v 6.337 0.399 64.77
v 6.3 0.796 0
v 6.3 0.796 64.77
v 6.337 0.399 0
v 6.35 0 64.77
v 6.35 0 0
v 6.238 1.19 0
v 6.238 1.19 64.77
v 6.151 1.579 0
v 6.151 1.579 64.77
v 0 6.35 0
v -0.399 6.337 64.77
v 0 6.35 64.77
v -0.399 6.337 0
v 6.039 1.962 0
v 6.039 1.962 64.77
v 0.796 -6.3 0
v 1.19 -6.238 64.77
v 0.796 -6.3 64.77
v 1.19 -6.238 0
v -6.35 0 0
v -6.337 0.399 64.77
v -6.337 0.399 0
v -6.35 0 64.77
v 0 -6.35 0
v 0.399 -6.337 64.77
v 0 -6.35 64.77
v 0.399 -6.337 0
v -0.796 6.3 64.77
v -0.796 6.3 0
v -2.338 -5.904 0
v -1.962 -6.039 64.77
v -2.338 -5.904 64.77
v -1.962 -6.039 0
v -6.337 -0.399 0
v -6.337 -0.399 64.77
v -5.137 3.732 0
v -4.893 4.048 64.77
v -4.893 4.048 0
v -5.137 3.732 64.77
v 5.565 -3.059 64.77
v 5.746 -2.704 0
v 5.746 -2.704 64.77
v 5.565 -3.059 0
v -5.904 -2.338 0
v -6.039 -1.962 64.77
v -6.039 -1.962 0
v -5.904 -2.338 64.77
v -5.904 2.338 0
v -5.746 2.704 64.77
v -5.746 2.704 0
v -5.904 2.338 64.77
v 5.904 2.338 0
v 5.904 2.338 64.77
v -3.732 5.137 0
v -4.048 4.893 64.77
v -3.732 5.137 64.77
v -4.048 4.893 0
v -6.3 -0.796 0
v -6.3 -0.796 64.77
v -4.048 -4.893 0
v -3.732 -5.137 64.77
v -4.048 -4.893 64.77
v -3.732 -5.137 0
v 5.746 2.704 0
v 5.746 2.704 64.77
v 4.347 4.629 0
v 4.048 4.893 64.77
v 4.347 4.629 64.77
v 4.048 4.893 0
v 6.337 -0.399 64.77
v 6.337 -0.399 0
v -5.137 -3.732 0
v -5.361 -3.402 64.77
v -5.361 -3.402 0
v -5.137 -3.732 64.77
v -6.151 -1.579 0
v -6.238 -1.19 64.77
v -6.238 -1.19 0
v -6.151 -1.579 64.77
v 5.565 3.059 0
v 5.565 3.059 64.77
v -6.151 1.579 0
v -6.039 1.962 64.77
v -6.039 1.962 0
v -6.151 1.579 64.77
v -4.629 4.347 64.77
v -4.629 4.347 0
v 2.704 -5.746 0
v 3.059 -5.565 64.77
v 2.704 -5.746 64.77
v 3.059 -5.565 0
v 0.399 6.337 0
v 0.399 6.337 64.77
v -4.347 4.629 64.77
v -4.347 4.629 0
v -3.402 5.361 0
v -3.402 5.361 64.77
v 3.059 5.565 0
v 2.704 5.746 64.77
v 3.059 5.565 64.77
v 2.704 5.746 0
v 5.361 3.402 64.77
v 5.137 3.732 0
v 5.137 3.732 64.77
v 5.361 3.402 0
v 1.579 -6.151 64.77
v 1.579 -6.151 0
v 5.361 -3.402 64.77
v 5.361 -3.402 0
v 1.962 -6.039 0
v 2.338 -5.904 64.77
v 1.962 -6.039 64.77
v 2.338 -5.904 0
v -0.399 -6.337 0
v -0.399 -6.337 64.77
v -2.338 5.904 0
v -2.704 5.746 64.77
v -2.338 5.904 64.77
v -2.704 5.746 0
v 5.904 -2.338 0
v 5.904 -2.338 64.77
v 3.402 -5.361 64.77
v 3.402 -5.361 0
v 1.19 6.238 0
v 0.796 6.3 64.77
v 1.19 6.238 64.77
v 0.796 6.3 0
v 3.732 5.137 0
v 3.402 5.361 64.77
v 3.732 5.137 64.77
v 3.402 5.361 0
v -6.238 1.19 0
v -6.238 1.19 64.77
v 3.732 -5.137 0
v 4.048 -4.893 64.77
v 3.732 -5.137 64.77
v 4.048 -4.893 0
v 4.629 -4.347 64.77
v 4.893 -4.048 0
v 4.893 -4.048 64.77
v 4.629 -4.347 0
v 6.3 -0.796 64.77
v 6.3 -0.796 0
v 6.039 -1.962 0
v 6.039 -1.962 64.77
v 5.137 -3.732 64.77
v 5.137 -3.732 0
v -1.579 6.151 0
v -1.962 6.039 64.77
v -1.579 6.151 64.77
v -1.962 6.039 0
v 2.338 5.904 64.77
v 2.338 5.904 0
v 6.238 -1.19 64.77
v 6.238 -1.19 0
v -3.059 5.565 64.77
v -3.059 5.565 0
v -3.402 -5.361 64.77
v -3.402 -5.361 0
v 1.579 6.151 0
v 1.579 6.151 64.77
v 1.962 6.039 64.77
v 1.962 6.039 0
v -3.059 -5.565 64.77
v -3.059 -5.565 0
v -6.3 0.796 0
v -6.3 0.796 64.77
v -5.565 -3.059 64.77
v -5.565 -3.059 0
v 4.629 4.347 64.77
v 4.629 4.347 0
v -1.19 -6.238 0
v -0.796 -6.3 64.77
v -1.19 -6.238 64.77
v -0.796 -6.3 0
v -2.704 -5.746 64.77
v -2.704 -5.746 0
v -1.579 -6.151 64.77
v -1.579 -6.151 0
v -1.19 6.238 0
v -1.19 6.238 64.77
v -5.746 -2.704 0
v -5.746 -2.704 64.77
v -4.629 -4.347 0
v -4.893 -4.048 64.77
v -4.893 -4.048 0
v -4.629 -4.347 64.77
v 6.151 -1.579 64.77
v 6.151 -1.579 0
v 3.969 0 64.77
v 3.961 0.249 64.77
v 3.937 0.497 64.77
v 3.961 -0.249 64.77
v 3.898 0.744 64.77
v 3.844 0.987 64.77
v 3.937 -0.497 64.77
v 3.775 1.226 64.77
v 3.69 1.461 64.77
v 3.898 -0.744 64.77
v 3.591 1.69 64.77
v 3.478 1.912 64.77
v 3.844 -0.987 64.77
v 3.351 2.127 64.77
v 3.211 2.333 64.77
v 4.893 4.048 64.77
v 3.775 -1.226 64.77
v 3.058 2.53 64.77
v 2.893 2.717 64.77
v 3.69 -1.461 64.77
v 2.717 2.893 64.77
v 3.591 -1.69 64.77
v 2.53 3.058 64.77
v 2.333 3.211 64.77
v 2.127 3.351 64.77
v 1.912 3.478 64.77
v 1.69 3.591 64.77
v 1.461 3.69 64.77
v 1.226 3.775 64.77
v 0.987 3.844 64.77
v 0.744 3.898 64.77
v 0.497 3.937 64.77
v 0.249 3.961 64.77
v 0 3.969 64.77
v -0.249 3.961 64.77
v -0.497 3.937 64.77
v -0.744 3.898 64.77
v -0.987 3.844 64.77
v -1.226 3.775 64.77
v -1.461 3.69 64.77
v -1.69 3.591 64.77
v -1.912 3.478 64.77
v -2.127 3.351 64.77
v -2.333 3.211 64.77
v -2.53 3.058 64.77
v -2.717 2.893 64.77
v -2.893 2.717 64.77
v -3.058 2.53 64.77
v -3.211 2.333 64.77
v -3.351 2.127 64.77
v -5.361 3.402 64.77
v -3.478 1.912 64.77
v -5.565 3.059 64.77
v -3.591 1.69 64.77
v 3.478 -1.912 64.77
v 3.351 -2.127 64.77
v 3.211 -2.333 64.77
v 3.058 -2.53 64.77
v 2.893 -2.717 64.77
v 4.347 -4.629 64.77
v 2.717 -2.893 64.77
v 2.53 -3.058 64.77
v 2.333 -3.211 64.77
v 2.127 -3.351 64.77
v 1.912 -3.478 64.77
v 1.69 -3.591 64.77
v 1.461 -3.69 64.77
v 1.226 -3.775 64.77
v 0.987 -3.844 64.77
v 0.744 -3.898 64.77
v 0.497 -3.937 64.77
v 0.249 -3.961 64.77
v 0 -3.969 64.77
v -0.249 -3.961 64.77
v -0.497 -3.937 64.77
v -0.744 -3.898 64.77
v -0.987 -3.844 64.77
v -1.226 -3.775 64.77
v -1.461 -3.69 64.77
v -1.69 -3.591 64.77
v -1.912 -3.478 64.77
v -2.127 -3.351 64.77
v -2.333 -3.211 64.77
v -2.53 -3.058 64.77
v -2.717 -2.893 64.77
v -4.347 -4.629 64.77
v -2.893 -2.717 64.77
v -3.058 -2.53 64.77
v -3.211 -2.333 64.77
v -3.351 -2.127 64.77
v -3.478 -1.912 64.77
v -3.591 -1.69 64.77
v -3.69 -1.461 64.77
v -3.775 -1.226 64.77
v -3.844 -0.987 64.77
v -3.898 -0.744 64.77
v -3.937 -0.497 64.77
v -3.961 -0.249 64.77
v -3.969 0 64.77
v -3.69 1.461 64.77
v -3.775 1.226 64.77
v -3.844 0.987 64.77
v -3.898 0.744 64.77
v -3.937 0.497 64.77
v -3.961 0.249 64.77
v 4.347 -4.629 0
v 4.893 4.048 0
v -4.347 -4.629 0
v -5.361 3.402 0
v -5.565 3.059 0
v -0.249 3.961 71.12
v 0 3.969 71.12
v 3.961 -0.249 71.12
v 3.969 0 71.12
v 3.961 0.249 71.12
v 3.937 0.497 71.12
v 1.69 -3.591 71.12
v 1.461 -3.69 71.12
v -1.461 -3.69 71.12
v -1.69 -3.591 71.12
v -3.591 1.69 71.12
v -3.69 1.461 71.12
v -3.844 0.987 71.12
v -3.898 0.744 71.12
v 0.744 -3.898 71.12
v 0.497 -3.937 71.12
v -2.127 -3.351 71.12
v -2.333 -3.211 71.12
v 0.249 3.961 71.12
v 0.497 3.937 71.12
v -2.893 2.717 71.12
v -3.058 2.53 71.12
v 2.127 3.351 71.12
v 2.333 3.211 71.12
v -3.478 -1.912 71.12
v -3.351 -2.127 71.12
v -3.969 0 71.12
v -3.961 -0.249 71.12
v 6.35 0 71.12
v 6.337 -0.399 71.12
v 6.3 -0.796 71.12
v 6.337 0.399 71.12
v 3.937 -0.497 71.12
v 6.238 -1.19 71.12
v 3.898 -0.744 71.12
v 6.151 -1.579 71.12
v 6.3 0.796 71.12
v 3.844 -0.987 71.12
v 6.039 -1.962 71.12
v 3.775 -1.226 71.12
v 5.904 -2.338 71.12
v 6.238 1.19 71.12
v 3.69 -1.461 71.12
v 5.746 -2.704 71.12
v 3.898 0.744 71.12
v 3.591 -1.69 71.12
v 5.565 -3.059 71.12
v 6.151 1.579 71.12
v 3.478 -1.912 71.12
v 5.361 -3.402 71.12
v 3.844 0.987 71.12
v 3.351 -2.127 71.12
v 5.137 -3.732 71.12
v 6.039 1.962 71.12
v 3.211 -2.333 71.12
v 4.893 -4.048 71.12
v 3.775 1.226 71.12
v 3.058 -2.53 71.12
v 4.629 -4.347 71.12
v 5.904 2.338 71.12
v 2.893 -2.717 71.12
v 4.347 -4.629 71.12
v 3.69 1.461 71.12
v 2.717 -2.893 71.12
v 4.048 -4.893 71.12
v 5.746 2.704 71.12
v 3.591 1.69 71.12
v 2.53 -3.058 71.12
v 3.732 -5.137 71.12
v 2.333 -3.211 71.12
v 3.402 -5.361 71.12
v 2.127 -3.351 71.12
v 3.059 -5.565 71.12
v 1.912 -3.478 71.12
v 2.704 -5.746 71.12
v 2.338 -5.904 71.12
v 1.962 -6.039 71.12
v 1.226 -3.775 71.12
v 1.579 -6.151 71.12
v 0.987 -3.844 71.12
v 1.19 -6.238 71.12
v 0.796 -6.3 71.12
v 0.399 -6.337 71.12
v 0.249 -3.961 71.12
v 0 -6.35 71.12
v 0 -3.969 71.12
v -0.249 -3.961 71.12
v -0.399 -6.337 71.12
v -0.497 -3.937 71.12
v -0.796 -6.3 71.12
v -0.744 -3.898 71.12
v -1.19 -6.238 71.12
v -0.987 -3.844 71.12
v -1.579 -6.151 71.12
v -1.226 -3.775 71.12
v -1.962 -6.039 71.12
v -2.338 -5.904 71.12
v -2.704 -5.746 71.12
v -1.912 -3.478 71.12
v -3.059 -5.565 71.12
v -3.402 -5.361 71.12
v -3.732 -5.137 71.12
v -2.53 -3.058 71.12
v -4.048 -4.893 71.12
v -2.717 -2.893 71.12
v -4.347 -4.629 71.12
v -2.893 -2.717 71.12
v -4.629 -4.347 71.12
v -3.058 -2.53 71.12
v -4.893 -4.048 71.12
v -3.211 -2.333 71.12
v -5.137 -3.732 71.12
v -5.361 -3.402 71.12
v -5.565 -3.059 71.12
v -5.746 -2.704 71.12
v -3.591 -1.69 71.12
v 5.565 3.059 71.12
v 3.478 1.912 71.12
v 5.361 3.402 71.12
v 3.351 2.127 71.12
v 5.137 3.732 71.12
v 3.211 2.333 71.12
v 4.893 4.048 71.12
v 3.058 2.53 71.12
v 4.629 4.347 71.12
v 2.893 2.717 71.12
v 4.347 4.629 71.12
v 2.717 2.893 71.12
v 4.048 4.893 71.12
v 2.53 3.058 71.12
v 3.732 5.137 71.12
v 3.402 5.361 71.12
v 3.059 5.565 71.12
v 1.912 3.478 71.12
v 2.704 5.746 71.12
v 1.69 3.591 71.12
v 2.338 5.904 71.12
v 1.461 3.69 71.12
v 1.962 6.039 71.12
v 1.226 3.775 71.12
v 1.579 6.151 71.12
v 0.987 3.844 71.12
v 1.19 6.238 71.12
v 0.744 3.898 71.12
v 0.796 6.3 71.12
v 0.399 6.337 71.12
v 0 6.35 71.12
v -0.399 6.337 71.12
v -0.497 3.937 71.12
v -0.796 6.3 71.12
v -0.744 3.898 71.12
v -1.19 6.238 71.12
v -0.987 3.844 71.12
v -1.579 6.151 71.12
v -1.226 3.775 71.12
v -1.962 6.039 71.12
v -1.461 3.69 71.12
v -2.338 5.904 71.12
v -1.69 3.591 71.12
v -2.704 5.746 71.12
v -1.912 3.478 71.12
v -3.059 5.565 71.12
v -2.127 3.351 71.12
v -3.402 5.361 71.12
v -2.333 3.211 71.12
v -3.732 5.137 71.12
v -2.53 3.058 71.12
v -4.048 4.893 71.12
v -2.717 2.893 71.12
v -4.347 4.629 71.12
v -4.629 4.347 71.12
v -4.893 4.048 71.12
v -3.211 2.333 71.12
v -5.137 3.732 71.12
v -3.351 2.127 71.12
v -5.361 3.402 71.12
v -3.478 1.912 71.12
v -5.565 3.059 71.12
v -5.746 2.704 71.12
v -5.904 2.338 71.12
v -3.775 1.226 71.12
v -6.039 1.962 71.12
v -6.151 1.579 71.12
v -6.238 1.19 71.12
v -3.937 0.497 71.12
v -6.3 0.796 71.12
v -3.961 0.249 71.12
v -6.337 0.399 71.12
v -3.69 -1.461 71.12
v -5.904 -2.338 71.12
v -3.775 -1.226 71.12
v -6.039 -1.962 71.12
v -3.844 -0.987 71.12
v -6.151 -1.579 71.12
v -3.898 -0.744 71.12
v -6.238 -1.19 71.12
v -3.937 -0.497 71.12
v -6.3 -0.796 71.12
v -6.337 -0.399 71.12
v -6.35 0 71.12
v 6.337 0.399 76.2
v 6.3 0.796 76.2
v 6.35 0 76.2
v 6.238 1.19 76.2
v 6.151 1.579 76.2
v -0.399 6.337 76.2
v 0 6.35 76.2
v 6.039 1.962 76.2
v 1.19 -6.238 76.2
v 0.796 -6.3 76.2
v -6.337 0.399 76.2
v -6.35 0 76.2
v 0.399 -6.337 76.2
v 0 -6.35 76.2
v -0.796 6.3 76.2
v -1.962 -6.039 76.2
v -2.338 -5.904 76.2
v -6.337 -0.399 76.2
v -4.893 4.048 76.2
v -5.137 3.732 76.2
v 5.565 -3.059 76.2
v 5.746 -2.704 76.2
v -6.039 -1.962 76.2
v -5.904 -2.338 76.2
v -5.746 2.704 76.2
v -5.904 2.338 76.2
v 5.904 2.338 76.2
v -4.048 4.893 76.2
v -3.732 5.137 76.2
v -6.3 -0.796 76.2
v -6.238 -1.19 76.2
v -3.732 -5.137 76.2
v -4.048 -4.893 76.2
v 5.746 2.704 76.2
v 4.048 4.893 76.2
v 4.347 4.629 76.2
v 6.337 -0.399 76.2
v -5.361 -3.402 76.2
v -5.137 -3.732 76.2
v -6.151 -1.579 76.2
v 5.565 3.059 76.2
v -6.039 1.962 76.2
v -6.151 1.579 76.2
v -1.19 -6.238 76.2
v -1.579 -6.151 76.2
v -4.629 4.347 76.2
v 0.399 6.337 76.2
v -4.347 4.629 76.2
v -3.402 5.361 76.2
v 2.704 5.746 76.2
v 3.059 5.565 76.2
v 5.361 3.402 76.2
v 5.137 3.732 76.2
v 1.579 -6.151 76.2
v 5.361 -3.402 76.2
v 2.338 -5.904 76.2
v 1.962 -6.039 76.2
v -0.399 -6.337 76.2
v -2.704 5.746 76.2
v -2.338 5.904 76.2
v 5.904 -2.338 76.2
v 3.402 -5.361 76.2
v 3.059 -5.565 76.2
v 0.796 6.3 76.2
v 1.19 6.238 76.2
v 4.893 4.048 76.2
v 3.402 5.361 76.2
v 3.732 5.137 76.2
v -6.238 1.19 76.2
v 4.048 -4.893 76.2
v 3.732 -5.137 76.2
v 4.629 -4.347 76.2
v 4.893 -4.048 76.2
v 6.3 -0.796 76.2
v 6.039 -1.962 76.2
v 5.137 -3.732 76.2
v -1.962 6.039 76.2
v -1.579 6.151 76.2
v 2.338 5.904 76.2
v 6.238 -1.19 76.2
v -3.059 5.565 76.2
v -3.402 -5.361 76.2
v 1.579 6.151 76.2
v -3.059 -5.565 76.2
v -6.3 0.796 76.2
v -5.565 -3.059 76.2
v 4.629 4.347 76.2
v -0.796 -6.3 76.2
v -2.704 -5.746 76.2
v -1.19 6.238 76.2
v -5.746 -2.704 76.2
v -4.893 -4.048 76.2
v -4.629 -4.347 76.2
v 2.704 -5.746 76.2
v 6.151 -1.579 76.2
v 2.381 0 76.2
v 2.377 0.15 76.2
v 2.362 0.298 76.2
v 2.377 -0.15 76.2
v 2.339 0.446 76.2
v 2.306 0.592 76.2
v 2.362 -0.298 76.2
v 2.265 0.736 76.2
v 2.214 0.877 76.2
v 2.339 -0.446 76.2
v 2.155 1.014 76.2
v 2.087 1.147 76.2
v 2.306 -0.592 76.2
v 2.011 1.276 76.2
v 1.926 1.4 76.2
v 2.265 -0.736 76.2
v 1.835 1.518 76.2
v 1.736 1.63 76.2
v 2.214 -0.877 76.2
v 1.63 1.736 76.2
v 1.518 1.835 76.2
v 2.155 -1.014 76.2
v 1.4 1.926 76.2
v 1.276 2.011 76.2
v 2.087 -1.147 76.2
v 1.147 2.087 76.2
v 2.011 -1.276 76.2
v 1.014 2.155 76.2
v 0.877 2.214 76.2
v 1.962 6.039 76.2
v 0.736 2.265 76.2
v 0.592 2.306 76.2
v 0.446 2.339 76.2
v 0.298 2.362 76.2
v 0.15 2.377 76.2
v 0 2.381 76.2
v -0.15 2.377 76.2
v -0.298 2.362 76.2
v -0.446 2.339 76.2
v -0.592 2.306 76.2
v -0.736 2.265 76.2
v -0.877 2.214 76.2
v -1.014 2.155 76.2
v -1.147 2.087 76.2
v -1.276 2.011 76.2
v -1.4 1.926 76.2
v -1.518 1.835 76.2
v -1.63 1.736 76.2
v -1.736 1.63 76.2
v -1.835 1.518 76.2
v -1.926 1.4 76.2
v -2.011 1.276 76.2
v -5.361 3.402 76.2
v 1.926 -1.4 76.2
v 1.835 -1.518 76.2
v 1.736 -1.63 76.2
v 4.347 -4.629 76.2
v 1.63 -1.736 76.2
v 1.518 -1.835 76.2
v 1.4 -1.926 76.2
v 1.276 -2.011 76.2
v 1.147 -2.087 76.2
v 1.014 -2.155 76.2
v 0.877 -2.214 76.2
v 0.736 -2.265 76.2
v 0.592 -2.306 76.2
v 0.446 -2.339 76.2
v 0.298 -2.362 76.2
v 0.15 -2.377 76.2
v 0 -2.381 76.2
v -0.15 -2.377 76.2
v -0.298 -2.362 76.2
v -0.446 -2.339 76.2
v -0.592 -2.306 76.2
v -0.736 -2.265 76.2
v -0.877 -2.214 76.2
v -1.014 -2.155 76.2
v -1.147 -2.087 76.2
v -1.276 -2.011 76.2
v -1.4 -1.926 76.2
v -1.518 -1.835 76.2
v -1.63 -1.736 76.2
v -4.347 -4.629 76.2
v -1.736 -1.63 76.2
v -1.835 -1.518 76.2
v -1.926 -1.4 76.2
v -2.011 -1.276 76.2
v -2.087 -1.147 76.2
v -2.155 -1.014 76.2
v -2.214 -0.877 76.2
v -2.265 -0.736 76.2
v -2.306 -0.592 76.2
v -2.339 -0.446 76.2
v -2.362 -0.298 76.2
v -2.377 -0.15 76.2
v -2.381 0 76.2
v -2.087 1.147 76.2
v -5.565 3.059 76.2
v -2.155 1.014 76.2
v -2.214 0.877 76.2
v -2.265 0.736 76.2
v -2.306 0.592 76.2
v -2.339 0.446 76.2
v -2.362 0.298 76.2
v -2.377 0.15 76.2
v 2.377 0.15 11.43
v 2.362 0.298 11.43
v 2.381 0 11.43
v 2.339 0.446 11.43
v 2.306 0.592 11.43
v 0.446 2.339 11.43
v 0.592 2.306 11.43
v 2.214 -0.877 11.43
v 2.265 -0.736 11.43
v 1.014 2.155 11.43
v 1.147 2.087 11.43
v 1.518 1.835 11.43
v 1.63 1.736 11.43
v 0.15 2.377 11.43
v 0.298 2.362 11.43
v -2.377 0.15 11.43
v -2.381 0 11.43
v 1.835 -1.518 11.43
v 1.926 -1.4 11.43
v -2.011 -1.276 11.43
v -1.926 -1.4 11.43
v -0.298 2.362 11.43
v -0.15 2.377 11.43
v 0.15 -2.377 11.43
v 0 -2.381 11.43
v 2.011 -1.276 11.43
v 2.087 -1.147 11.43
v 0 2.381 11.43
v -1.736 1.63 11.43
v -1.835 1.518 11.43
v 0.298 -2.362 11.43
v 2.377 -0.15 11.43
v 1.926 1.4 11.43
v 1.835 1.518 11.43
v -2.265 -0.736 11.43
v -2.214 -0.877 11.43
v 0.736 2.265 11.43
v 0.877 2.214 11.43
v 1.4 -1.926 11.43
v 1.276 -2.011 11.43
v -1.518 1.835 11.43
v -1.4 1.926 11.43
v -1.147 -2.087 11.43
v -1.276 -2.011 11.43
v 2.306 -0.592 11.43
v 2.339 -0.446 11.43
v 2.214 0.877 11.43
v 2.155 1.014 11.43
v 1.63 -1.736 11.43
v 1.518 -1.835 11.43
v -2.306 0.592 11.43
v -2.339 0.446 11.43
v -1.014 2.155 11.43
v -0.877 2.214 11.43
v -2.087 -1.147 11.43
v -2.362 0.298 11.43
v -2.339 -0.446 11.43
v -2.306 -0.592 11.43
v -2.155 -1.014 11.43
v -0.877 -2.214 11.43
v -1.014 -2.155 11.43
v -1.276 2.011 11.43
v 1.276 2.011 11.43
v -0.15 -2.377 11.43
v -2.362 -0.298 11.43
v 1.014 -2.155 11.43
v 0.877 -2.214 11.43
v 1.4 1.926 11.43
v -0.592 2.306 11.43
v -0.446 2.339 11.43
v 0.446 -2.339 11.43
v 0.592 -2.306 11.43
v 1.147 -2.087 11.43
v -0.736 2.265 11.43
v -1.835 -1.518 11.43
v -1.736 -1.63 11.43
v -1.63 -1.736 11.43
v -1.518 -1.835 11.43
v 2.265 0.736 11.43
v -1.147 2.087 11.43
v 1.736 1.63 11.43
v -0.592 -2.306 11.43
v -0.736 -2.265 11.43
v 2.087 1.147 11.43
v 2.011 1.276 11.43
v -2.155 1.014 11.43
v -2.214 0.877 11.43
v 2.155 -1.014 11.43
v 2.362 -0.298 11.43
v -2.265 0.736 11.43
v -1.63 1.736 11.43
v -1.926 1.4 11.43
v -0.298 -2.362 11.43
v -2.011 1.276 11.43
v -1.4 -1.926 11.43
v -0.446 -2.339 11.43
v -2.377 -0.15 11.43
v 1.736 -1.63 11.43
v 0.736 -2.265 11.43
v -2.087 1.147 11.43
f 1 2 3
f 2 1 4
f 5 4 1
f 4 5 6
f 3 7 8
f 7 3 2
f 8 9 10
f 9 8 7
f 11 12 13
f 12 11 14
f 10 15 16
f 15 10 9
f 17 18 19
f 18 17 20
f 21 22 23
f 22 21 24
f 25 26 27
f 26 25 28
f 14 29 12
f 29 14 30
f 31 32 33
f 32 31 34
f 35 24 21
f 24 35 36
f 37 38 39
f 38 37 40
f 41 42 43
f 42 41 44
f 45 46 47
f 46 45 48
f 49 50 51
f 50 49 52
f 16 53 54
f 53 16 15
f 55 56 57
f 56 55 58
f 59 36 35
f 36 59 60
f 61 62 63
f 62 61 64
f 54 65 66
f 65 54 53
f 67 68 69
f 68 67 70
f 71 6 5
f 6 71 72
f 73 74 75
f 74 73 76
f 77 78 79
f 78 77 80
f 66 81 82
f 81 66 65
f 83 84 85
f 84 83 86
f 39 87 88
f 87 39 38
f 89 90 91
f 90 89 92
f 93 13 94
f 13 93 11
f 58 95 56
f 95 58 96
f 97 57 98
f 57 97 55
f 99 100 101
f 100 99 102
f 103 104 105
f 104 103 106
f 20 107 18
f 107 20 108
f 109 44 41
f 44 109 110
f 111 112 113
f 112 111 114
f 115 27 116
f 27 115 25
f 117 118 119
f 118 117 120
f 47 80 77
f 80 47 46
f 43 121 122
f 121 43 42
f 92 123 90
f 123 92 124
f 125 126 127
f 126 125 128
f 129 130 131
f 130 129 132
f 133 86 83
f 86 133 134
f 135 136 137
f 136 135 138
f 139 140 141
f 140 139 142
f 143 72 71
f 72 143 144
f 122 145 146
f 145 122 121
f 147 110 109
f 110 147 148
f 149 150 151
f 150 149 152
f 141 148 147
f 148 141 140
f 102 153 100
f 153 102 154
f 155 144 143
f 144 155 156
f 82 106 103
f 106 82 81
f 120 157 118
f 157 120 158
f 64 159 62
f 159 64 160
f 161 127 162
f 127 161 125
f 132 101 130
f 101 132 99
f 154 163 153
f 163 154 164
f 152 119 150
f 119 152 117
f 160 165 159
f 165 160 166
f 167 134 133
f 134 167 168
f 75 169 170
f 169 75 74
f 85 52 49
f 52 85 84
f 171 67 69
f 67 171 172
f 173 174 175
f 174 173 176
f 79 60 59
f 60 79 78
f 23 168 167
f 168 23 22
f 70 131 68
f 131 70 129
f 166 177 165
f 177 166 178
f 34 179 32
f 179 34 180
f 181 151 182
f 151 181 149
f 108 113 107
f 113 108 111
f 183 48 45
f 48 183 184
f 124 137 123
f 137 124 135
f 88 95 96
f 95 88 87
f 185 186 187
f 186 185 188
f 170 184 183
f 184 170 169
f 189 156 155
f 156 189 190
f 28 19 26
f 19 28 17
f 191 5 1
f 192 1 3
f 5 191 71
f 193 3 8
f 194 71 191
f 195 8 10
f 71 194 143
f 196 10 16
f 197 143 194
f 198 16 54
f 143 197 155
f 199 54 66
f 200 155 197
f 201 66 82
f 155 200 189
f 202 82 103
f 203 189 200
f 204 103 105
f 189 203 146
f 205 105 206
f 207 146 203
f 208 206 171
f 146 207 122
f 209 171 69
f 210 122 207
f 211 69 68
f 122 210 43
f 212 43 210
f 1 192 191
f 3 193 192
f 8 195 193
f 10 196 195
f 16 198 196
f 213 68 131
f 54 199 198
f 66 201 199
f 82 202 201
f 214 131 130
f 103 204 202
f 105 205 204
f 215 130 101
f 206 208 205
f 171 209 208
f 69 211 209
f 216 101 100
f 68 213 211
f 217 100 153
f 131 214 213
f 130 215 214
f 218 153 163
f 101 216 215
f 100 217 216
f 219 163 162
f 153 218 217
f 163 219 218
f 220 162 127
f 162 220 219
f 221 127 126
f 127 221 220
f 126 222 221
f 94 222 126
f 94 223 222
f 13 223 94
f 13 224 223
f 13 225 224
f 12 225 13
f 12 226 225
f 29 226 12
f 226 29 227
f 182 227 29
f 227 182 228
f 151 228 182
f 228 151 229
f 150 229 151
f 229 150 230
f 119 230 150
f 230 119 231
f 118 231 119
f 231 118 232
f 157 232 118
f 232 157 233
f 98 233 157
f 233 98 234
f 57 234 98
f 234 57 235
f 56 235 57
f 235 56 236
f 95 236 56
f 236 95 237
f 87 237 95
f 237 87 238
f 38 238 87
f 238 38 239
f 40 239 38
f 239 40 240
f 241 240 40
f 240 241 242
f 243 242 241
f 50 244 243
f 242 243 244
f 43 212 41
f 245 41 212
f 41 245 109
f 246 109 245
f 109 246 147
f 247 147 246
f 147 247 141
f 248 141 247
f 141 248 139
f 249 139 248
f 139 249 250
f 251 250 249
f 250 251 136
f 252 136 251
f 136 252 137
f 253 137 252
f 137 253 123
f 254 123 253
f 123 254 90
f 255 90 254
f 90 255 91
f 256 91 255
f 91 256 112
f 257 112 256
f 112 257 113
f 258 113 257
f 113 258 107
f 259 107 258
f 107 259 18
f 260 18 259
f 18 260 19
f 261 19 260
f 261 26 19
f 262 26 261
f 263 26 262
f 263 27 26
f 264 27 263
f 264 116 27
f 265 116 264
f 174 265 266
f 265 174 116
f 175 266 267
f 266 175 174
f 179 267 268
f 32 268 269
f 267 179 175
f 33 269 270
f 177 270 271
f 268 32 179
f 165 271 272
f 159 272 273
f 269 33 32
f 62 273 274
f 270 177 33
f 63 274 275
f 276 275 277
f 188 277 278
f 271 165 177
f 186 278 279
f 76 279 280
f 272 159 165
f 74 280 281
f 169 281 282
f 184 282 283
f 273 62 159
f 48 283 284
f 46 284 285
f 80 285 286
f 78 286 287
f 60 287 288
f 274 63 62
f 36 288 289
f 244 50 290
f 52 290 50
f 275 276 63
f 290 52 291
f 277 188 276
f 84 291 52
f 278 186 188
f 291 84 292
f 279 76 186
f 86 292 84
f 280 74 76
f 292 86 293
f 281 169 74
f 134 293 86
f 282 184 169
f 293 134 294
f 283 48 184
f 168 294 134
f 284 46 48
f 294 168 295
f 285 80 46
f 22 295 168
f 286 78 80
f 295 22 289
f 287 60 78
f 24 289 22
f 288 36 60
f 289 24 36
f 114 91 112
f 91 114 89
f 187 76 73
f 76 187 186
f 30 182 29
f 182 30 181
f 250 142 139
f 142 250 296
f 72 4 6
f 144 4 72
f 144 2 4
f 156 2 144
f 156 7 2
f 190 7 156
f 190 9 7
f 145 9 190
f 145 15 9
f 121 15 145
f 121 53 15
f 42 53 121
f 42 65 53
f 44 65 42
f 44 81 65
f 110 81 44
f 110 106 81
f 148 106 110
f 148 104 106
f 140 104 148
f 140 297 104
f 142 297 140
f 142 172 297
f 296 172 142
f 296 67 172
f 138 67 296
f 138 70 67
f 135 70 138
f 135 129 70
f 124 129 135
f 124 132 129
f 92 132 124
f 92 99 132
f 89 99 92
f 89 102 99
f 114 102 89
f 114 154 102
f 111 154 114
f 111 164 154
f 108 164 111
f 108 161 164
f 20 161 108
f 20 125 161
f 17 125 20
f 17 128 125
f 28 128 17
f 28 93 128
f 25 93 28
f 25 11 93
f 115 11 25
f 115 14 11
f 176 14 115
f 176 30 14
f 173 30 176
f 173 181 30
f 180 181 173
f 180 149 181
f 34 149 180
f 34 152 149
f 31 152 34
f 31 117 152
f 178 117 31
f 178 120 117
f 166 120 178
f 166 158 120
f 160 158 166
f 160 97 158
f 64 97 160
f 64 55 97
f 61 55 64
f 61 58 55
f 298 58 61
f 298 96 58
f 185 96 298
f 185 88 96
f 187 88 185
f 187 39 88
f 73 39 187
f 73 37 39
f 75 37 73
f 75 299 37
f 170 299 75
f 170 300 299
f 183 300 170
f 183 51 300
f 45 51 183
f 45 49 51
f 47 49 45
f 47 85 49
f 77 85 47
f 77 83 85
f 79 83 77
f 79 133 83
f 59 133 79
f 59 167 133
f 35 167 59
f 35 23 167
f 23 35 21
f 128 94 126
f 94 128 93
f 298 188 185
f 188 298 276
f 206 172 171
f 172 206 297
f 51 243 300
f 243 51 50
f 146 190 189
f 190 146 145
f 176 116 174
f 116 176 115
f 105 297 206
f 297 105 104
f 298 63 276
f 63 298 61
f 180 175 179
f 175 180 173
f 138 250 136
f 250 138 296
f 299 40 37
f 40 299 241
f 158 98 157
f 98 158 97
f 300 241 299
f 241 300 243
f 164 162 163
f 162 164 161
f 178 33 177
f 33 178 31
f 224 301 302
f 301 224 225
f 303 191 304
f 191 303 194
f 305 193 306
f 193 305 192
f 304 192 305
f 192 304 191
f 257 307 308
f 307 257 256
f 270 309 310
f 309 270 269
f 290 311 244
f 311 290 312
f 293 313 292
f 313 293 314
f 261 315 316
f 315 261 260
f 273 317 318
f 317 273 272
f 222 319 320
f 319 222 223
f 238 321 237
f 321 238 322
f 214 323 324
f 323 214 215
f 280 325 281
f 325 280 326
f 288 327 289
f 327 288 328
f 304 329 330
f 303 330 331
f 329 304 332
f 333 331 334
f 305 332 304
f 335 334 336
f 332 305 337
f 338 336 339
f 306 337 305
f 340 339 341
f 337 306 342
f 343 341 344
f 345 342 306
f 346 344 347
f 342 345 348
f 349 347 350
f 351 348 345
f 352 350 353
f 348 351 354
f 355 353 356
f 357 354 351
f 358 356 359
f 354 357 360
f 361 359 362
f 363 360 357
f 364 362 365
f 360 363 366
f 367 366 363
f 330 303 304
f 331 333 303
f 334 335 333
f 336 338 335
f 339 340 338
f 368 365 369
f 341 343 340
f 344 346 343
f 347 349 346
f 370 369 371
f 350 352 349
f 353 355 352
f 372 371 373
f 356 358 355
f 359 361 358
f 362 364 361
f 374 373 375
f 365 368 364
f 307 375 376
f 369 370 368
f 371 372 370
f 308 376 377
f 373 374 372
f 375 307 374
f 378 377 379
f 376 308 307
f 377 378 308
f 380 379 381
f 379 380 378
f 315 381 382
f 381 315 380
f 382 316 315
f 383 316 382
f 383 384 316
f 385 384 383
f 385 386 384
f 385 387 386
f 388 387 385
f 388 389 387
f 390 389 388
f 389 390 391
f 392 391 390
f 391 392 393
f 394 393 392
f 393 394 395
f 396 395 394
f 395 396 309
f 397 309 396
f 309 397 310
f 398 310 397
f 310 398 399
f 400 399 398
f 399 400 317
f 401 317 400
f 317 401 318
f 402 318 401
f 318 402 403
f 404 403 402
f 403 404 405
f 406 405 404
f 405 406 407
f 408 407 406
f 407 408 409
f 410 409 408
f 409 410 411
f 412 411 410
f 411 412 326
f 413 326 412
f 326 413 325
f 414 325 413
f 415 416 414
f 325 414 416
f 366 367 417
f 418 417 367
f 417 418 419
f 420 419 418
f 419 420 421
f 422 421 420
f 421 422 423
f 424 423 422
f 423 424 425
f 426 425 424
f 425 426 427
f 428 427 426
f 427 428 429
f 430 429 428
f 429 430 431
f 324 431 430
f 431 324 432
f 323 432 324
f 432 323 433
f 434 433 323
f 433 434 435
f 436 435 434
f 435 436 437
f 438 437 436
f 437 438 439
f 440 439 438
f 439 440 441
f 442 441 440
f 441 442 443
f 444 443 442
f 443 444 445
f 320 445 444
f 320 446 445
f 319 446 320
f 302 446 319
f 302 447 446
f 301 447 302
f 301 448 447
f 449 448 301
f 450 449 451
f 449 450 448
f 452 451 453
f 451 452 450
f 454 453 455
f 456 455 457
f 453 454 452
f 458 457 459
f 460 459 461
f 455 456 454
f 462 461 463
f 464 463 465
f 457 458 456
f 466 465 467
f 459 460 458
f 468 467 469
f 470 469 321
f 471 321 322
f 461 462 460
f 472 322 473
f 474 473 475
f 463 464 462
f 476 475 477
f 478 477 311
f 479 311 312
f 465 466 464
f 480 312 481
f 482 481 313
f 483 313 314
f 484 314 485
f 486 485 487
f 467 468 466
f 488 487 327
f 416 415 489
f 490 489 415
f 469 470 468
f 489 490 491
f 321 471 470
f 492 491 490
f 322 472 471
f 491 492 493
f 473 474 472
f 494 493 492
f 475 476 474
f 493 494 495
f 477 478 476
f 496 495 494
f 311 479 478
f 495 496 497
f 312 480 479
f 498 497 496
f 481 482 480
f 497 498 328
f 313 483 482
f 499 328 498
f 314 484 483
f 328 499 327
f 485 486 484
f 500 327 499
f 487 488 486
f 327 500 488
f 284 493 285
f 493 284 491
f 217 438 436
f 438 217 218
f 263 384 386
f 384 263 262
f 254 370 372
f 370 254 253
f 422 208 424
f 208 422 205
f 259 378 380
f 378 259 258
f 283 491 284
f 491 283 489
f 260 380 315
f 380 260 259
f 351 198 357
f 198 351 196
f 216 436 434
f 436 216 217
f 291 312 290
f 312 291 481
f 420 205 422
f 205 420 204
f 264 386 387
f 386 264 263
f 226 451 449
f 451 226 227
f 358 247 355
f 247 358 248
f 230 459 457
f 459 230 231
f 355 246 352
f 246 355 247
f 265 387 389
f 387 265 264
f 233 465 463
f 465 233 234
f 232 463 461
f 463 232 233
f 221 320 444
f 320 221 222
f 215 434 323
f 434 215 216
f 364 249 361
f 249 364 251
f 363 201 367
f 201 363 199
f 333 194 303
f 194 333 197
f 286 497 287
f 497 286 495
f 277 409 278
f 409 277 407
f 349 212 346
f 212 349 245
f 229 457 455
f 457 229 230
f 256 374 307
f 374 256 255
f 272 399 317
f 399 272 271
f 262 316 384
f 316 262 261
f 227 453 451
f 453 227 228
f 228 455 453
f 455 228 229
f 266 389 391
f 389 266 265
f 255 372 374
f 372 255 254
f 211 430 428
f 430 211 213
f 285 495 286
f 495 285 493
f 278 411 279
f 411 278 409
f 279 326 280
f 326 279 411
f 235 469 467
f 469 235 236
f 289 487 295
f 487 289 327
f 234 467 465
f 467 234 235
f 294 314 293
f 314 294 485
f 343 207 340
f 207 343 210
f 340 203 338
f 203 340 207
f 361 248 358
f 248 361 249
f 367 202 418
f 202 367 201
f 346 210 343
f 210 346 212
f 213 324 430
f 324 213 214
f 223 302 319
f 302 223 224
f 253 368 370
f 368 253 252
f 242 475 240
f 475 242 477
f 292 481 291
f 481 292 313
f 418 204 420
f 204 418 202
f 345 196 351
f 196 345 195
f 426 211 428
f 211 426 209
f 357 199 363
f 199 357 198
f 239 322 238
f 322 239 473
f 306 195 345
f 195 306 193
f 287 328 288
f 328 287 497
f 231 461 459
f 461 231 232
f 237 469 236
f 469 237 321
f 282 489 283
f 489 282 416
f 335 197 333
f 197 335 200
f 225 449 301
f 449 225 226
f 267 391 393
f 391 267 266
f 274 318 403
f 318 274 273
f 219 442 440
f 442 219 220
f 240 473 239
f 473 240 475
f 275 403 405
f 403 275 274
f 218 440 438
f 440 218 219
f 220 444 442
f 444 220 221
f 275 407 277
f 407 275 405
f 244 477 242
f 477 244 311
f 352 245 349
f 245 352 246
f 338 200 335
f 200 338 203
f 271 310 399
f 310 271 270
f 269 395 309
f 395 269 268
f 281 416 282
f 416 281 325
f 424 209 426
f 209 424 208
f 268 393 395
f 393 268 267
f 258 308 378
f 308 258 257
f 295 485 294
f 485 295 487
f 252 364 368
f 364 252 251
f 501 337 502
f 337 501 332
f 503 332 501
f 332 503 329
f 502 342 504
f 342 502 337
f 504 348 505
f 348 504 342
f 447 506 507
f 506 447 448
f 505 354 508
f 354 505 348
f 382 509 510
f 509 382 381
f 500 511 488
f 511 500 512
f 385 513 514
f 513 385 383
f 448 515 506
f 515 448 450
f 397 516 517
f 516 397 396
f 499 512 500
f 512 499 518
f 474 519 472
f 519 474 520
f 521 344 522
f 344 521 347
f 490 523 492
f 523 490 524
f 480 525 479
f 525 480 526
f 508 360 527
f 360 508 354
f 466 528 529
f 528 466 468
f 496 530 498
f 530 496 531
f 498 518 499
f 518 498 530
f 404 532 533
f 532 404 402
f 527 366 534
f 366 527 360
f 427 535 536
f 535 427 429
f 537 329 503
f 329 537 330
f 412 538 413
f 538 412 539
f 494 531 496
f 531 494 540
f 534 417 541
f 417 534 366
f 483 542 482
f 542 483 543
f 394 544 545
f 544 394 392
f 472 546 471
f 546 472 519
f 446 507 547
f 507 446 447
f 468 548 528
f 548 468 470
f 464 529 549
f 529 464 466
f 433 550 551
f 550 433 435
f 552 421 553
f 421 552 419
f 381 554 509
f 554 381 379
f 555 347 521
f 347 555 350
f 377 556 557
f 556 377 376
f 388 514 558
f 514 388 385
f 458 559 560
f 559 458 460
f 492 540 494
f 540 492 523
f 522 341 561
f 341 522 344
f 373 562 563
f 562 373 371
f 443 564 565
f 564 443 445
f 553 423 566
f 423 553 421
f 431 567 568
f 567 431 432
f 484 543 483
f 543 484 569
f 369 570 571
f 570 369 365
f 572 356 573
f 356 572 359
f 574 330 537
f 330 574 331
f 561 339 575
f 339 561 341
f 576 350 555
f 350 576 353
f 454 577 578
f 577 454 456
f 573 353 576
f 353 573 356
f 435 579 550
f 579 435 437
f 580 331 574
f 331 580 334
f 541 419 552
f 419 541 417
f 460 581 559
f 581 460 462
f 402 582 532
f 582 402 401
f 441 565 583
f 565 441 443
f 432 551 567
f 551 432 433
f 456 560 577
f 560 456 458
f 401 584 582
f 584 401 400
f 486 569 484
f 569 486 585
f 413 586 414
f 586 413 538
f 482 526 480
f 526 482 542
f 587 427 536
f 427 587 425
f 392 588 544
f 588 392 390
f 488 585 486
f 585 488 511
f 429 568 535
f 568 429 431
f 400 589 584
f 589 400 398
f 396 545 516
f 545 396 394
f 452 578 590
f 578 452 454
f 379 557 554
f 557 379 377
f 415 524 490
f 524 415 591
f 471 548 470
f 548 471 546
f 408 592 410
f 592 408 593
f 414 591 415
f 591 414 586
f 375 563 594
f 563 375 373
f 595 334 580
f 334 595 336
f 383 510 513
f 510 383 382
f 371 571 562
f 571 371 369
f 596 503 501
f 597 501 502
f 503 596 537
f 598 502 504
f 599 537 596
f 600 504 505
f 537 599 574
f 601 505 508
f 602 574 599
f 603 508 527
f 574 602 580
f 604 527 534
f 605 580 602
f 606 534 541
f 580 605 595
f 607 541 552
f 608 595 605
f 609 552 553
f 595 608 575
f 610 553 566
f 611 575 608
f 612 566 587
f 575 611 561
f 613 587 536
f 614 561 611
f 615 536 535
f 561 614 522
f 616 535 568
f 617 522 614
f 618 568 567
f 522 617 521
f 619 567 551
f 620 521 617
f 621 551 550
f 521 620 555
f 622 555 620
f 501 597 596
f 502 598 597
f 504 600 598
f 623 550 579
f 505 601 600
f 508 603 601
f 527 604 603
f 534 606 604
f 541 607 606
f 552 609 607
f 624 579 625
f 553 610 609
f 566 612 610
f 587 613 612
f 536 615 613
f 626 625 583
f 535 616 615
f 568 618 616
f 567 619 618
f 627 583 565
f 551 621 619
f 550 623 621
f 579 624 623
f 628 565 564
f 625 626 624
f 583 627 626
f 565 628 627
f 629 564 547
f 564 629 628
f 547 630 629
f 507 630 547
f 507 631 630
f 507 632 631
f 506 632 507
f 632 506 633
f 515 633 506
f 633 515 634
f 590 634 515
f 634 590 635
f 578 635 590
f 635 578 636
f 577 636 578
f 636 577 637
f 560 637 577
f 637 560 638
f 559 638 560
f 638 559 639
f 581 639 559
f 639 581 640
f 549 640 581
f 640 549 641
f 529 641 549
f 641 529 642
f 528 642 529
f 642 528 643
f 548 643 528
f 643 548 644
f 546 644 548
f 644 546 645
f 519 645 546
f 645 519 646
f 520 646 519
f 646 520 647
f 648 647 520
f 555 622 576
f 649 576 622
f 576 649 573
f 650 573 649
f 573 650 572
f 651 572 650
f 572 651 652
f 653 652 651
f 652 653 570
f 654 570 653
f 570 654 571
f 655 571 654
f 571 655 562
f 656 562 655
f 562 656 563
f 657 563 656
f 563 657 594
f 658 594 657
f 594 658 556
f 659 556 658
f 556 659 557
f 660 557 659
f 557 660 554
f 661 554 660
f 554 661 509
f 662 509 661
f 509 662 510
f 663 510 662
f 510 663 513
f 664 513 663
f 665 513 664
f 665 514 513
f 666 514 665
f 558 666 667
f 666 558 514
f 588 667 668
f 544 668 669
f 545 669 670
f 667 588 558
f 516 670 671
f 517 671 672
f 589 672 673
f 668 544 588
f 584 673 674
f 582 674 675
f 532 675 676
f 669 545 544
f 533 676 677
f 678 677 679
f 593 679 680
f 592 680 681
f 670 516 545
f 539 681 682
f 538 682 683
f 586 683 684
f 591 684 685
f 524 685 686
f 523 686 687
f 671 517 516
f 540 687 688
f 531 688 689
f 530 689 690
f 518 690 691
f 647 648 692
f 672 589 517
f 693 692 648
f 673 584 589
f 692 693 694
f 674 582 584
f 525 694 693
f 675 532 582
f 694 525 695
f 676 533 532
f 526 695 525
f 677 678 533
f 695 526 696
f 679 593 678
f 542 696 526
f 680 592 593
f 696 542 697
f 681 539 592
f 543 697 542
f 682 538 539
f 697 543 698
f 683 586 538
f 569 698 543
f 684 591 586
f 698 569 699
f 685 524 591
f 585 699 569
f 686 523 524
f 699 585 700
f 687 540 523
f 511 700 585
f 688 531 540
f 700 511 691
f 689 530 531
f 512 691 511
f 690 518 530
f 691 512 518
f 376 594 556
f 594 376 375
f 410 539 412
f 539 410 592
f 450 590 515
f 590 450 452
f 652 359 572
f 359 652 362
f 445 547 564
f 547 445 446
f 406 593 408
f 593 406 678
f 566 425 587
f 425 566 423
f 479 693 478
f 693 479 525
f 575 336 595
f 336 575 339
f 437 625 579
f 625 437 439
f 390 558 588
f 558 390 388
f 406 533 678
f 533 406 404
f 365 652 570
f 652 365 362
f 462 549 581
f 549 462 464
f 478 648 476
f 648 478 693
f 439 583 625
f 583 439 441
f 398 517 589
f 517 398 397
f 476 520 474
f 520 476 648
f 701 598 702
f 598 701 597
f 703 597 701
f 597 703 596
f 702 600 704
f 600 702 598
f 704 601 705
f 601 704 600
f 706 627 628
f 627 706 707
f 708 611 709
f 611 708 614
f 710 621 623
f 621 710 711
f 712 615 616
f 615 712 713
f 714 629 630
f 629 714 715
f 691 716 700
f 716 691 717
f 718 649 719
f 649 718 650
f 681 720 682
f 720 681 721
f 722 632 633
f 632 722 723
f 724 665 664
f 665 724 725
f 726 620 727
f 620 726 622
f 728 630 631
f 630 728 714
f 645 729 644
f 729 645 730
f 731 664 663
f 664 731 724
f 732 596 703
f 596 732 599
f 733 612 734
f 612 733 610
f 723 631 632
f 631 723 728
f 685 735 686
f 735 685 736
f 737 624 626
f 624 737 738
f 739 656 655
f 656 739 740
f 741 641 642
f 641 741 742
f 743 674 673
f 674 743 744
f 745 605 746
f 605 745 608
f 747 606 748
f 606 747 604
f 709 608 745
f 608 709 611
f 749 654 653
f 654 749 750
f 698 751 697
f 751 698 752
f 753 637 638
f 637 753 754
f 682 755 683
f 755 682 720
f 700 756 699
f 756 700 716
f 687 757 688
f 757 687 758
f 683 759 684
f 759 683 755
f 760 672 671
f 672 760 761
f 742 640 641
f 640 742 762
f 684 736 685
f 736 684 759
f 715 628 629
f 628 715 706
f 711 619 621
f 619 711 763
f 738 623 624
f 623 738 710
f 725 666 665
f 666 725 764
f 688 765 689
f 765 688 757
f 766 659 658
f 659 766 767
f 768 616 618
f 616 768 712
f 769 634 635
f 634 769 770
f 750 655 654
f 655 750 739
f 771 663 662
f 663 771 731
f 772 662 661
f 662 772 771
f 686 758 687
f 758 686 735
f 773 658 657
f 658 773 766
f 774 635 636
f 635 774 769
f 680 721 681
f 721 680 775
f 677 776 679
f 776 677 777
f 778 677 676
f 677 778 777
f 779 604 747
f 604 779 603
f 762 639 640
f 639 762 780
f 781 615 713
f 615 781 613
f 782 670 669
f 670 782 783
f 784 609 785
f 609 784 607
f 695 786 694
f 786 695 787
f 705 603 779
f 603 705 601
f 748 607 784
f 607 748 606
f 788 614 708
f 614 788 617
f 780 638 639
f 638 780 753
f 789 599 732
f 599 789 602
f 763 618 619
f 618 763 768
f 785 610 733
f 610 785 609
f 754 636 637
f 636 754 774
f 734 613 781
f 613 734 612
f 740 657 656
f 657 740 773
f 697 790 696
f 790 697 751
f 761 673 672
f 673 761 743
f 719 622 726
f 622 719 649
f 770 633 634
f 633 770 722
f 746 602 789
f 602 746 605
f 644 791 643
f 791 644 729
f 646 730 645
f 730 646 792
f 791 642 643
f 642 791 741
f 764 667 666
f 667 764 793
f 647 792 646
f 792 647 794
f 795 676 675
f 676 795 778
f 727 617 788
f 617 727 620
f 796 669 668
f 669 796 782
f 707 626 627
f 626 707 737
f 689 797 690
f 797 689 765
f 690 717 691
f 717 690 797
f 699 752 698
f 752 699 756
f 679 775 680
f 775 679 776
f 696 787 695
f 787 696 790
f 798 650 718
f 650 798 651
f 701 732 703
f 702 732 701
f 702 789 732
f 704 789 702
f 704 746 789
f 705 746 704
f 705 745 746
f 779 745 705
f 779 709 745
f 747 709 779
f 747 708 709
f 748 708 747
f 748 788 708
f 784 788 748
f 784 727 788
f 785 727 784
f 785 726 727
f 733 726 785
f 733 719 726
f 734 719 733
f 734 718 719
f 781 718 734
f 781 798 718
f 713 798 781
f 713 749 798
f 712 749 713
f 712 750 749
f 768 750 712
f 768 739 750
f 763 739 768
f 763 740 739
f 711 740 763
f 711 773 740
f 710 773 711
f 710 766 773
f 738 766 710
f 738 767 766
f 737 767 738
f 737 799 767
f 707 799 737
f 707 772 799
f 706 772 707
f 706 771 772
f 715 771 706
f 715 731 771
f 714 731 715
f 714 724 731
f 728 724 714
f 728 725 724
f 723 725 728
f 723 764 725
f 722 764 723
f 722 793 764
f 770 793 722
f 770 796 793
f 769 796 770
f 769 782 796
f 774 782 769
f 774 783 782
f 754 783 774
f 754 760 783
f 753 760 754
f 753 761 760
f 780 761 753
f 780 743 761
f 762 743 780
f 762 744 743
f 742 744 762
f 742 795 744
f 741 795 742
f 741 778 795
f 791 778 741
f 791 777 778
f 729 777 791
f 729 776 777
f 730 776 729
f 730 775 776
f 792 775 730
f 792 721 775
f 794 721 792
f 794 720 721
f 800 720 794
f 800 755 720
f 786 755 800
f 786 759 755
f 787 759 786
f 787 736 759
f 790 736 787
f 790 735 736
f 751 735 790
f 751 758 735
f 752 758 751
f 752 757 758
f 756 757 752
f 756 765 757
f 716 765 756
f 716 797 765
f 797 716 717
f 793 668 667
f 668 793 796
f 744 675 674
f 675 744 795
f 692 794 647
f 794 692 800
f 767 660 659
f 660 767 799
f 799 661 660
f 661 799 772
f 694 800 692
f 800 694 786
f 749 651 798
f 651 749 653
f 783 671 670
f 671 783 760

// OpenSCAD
OD = 25.4*1/2;				//Outer Diameter
ID = 25.4*3/16;			//Hole Diameter
OL = 25.4*3;				//Overall Length
TL = 25.4*.25;				//Throat Length
TD = 25.4*5/16;			//Throat Diameter
LL = 25.4*.2;				//Lip Length

difference() {
	union() {
		cylinder(d=OD, h=OL-TL-LL, $fn=100);
		translate([0,0,OL-TL-LL]) cylinder(d=TD, h=TL, $fn=100);
		translate([0,0,OL-LL]) cylinder(d=OD, h=LL, $fn=100);
	}
	translate([0,0,LL+TL]) cylinder(d=ID, h=OL-TL, $fn=100);
}
